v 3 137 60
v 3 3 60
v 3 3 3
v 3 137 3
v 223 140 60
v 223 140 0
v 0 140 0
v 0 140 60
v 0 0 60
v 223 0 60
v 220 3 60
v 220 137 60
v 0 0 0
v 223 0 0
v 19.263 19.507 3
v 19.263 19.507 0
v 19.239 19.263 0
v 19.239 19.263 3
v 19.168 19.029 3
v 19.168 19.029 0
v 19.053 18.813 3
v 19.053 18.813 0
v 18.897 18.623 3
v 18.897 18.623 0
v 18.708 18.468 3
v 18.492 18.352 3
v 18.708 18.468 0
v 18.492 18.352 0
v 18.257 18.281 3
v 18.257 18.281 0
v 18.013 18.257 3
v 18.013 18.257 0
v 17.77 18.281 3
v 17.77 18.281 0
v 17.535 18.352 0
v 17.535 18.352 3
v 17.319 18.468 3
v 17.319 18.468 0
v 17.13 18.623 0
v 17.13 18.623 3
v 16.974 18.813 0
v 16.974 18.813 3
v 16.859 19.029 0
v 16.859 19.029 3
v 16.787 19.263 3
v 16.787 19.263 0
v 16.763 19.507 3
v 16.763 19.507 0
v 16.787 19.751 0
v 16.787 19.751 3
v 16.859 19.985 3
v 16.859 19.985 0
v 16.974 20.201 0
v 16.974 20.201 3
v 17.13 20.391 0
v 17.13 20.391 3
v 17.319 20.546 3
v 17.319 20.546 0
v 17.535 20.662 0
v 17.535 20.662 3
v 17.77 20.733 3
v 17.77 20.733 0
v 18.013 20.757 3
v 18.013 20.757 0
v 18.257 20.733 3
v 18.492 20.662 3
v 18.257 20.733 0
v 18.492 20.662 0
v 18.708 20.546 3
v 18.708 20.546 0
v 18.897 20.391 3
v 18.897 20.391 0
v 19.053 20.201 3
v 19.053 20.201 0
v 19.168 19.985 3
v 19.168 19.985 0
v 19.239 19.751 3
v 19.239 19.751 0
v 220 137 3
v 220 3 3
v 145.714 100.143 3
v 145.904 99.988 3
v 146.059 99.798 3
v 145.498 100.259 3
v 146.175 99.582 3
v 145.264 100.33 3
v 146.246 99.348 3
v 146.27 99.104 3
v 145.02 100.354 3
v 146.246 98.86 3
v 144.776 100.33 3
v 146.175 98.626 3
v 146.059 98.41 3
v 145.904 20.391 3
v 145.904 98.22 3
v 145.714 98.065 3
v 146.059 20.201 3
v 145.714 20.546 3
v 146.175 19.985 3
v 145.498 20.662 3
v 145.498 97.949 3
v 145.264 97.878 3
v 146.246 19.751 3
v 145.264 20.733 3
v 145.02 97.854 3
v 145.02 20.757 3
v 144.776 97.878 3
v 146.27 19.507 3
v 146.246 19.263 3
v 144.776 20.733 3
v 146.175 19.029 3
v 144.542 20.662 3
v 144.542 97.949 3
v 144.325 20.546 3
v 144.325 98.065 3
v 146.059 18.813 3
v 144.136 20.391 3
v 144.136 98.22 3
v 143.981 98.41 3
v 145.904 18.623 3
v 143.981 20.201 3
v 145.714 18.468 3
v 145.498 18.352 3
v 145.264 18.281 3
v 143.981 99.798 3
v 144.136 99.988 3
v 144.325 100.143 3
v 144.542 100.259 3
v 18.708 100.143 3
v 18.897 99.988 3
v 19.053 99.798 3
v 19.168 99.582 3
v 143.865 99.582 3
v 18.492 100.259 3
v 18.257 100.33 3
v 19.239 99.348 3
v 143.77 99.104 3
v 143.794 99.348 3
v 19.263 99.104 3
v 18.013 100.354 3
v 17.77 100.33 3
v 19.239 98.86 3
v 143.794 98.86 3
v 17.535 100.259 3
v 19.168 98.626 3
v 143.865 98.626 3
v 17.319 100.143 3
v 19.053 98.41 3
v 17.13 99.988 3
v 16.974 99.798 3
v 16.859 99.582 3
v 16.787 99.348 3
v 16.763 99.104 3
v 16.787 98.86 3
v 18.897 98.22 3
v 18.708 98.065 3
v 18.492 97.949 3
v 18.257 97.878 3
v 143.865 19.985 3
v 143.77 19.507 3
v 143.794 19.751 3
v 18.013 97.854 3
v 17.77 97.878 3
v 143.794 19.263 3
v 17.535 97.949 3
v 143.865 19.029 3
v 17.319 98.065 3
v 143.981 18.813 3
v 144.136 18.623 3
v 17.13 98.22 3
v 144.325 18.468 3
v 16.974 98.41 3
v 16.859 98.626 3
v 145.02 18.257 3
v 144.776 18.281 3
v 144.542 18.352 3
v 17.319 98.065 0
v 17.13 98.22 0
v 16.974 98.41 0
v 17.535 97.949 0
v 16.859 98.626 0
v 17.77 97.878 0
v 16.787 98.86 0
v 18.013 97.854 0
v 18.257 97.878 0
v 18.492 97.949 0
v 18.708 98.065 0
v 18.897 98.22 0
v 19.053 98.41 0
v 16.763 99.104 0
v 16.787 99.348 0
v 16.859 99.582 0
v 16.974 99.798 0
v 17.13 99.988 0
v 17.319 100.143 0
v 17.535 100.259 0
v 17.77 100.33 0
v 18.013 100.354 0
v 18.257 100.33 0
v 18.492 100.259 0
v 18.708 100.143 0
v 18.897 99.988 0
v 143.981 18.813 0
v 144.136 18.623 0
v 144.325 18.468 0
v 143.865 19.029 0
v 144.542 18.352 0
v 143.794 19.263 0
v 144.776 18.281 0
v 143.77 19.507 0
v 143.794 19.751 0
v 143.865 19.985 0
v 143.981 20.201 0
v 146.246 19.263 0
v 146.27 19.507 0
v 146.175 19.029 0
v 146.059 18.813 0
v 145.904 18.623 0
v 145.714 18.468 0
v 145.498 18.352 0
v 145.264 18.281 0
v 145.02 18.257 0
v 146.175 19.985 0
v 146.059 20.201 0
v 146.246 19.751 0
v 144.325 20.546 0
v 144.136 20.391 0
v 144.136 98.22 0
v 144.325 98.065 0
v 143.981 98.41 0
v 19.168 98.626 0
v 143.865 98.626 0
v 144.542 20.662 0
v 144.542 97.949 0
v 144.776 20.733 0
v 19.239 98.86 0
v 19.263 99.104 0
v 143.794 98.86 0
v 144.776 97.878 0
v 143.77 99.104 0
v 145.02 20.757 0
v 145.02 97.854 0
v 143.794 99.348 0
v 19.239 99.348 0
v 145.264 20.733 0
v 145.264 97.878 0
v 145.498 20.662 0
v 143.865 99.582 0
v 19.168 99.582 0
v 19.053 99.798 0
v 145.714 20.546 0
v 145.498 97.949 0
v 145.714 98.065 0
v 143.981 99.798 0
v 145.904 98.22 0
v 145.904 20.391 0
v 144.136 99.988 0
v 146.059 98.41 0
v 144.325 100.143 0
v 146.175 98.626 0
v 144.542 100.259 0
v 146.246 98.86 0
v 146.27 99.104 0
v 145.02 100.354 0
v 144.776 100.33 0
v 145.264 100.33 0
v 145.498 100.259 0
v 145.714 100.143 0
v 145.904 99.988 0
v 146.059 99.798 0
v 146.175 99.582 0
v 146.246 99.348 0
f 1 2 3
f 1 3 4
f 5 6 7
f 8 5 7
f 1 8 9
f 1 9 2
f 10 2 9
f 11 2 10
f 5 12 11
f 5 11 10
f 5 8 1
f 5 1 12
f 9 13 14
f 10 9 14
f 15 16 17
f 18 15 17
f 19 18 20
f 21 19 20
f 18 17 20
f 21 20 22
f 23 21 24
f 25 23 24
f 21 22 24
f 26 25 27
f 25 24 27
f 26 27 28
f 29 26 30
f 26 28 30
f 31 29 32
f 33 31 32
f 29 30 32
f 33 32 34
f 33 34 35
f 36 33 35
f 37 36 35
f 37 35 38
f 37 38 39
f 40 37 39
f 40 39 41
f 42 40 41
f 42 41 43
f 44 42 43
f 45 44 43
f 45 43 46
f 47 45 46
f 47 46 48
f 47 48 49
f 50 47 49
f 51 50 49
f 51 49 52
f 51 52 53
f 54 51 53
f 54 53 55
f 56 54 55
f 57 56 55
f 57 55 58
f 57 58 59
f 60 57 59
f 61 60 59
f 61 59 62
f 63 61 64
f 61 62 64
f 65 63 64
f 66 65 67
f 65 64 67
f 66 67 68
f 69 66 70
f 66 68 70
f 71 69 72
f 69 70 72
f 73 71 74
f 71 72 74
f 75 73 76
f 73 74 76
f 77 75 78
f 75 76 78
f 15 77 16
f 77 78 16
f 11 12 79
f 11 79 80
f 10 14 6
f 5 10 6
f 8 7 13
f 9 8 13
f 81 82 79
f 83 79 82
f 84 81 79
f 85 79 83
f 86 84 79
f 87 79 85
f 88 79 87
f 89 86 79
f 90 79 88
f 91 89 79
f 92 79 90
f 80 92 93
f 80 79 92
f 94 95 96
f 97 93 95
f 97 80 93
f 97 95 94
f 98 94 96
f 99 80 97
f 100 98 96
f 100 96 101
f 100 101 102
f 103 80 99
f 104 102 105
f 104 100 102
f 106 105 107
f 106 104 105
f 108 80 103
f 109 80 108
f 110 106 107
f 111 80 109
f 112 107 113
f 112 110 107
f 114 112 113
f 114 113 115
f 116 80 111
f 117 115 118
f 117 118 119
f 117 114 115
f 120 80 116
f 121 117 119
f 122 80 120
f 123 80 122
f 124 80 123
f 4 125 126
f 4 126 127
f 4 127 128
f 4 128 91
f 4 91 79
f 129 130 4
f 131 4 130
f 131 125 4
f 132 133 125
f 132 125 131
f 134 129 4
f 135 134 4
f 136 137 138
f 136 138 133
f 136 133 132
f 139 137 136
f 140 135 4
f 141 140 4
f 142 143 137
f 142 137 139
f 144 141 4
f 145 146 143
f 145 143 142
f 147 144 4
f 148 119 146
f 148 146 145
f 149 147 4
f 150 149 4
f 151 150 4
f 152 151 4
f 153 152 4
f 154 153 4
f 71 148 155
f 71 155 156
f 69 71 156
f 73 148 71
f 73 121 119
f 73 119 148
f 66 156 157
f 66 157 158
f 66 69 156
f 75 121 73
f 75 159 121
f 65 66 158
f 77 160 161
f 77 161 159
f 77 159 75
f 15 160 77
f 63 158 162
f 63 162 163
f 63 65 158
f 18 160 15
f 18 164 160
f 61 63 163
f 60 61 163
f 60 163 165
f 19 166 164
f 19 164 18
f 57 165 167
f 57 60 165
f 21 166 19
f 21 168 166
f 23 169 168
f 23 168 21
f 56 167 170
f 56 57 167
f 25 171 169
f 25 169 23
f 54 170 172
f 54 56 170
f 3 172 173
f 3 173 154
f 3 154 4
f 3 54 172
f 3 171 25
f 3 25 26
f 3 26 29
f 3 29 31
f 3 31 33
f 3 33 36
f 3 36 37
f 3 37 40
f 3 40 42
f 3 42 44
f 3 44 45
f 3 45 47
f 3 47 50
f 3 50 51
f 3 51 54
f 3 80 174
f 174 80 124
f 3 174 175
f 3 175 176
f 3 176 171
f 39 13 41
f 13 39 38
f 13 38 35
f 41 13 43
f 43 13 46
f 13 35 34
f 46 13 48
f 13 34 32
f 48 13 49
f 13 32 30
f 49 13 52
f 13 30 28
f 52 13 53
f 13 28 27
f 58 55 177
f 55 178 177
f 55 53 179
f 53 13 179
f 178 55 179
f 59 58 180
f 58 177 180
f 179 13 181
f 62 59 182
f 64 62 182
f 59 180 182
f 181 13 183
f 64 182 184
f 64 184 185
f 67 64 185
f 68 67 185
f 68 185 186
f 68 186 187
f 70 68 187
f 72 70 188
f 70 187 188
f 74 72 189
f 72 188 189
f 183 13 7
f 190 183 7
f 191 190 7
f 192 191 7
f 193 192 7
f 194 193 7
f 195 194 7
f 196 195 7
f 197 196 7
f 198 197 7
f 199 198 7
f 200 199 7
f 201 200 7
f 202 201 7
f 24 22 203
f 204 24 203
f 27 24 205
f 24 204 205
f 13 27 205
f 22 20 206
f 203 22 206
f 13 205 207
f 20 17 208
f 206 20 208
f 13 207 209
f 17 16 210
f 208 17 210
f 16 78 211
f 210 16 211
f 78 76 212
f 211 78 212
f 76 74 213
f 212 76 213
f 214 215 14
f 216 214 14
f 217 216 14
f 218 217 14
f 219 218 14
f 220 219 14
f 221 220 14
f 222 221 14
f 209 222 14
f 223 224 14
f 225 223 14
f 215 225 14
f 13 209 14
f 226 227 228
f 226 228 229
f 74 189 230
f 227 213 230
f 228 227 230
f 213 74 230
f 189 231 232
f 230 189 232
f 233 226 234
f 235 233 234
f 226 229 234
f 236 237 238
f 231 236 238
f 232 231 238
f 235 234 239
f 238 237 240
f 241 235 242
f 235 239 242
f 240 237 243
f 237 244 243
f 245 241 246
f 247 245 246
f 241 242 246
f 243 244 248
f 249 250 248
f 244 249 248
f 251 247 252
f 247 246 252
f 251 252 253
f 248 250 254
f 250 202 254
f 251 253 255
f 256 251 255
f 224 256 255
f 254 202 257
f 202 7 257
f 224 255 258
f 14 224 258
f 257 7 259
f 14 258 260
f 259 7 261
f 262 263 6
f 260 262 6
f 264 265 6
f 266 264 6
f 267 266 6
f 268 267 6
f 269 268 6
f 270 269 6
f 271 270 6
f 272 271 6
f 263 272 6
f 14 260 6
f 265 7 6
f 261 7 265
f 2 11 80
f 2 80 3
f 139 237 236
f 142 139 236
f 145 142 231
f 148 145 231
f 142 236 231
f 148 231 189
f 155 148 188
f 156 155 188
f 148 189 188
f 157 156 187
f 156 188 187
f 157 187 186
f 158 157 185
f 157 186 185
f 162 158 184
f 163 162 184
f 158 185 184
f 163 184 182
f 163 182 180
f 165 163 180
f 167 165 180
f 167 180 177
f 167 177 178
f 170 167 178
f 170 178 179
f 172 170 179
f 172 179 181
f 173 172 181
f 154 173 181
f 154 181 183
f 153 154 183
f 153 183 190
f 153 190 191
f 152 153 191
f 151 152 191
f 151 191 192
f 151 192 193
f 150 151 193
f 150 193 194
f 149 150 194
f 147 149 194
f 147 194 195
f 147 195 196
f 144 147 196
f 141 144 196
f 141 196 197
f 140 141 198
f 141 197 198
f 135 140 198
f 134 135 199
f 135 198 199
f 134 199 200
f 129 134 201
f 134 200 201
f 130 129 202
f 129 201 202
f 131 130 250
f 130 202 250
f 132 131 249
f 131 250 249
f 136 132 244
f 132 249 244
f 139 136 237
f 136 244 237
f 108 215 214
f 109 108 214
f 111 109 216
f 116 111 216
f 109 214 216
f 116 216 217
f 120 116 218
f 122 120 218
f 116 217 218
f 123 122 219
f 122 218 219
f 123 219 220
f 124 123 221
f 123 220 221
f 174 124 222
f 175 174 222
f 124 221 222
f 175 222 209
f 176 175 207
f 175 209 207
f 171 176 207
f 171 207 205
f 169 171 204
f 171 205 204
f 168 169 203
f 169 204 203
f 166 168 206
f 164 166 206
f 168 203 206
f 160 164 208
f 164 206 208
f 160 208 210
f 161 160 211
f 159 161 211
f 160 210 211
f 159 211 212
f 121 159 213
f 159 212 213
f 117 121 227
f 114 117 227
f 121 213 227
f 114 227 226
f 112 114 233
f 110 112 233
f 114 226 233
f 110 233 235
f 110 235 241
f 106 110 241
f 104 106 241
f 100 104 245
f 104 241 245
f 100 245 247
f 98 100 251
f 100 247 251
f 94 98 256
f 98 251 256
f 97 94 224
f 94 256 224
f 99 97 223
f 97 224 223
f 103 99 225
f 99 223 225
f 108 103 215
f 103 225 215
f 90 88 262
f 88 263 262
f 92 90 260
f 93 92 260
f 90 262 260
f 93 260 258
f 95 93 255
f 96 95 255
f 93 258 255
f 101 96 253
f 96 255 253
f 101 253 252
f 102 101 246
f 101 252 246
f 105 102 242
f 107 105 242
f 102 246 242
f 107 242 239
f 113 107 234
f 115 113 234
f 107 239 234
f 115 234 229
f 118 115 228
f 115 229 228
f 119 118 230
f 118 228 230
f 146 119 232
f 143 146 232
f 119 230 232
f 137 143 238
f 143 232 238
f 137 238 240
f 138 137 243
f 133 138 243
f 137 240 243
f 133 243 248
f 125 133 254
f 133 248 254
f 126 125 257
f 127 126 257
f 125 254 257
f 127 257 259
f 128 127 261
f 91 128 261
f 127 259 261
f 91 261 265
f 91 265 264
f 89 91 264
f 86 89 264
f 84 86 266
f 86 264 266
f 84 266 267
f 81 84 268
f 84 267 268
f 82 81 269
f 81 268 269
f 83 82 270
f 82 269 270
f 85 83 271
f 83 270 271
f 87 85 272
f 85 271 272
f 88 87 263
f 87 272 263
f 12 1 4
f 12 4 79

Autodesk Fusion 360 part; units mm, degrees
sketch "Sketch1" plane through (0, 0, 0) normal (0, 0, 1) x (1, 0, 0)
  line L0 (0, 0) -> (223, 0)
  line L1 (223, 0) -> (223, 140)
  line L2 (223, 140) -> (0, 140)
  line L3 (0, 140) -> (0, 0)
  dimension "d1" = 223
  dimension "d2" = 140
extrude "Extrude1" add sketch "Sketch1" along normal blind 60
sketch "Sketch2" plane through (0, 0, 60) normal (0, 0, 1) x (-1, 0, 0)
  line L0 (0, -140) -> (0, 0)
  line L1 (0, 0) -> (-223, 0)
  line L2 (-223, 0) -> (-223, -140)
  line L3 (-223, -140) -> (0, -140)
  line L4 (-3, -137) -> (-220, -137)
  line L5 (-220, -137) -> (-220, -3)
  line L6 (-220, -3) -> (-3, -3)
  line L7 (-3, -3) -> (-3, -137)
  dimension "d5" = 3
  dimension "d6" = 3
  dimension "d7" = 3
  dimension "d8" = 3
extrude "Extrude2" cut sketch "Sketch2" against normal blind 57 contours L4 L5 L6 L7
sketch "Sketch3" plane through (0, 0, 0) normal (0, 0, -1) x (1, 0, 0)
  line L0 (0, 0) -> (0, -140)
  line L1 (0, -140) -> (223, -140)
  line L2 (223, -140) -> (223, 0)
  line L3 (223, 0) -> (0, 0)
  line L4 (205.0199, -4.8072) -> (6.0134, -4.8072) construction
  line L5 (6.0134, -113.804) -> (205.0199, -113.804) construction
  line L6 (205.0199, -113.804) -> (9.7448, -113.804) construction
  line L7 (205.0199, -59.3055) -> (147.0519, -59.3055) construction
  circle A0 centre (145.0199, -99.104) radius 1.25
  circle A1 centre (145.0199, -19.507) radius 1.25
  circle A2 centre (18.0134, -99.104) radius 1.25
  line L8 (6.0134, -4.8072) -> (6.0134, -113.804) construction
  line L9 (205.0199, -113.804) -> (205.0199, -4.8072) construction
  line L10 (6.0134, -111.0749) -> (6.0134, -6.1412) construction
  circle A3 centre (18.0134, -19.507) radius 1.25
  point P0 (180.3238, -104.2905)
  dimension "d11" = 12
  dimension "d12" = 14.7
  dimension "d13" = 2.5
  dimension "d17" = 108.9968
  dimension "d18" = 54.4985
  dimension "d19" = 2.5
  dimension "d20" = 60
  dimension "d21" = 14.7
extrude "Extrude3" cut sketch "Sketch3" against normal up to surface (3 mm away) contours A0 | A1 | A2 | A3
